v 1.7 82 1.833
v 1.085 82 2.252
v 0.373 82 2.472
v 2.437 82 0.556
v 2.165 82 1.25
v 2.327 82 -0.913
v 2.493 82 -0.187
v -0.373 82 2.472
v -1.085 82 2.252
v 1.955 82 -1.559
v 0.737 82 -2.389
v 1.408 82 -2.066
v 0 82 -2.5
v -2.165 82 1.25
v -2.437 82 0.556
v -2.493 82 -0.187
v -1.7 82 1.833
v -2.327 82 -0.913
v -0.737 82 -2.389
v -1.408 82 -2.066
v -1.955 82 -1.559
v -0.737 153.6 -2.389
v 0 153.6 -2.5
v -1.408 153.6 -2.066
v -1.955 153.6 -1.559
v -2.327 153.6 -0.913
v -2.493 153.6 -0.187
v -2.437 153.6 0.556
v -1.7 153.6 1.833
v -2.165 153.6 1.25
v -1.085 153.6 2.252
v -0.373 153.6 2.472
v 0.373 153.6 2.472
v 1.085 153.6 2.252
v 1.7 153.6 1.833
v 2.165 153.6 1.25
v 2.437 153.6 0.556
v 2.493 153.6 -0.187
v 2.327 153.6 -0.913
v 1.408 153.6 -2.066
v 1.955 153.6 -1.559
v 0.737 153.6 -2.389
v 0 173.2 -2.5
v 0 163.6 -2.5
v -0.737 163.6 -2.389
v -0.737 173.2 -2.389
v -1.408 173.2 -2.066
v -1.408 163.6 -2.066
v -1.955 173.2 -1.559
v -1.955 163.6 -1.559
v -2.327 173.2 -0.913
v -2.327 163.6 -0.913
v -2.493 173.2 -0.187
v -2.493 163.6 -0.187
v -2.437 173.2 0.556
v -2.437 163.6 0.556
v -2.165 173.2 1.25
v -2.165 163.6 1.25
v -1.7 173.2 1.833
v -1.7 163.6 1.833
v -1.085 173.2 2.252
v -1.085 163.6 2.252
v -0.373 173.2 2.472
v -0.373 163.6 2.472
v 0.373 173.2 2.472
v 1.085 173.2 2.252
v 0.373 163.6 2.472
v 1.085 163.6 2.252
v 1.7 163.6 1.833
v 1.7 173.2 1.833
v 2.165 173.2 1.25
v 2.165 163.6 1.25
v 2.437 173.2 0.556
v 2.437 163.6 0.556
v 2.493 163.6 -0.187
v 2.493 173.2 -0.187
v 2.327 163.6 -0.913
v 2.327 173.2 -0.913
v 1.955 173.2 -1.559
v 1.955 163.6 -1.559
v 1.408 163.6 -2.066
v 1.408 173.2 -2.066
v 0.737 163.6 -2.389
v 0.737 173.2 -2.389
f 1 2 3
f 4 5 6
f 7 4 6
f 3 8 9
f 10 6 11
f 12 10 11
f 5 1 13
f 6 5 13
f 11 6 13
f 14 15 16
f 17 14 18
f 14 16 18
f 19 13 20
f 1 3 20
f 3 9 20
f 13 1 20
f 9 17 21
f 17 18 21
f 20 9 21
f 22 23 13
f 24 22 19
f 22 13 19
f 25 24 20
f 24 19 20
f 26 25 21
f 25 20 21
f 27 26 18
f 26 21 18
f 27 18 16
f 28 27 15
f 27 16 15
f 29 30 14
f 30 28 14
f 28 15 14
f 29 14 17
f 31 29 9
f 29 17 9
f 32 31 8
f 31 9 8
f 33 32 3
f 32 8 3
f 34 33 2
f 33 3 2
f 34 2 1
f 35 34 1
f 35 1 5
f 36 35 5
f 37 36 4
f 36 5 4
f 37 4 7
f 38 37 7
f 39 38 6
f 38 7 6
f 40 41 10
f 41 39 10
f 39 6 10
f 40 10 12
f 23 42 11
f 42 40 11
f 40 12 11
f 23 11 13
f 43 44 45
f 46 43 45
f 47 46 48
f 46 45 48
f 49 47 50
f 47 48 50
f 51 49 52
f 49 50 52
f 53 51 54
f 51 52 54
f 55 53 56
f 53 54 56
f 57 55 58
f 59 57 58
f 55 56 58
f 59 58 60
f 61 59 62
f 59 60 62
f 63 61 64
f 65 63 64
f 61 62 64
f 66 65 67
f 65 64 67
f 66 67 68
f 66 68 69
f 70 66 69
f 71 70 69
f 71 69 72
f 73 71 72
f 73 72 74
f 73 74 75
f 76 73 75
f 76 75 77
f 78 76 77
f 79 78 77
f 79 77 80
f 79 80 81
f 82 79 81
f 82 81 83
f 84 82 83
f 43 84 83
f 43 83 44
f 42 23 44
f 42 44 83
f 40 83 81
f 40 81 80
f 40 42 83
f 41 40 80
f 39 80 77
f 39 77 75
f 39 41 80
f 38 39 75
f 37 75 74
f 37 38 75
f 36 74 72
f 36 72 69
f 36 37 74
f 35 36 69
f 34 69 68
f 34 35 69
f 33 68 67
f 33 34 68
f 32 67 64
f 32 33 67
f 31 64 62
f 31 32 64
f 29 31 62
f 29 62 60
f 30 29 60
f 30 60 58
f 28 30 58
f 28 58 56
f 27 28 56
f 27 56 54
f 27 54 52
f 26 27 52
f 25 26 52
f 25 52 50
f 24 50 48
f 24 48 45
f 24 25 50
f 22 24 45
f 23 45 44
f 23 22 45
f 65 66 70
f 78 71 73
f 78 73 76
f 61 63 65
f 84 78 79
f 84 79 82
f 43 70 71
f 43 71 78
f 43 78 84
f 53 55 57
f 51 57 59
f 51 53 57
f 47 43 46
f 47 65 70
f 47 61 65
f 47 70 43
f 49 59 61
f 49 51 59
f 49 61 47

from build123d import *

# Parameters (mm, degrees)
SKETCH_1_R               = 2.5
EXTRUDE_1_DEPTH          = 173.2
SKETCH_3_R               = 77
EXTRUDE_4_DEPTH          = 4
SKETCH_8_R               = 15
EXTRUDE_7_DEPTH          = 3
CUT_EXTRUDE_2_REACH      = 198.527
SKETCH_9_R               = 5
PATTERN_CIRCULAR_1_COUNT = 3
SKETCH_11_R              = 2.5
CUT_EXTRUDE_4_DEPTH      = 143.040275978
EXTRUDE_START            = 6.6
SKETCH_12_R              = 2.5
EXTRUDE_8_DEPTH          = 6.6
CUT_EXTRUDE_6_REACH      = 138.076
SKETCH_13_R              = 77
SKETCH_13_R_2            = 15
SKETCH_14_R              = 15
CUT_EXTRUDE_7_DEPTH      = 10
SKETCH_15_R              = 2.5
EXTRUDE_9_DEPTH          = 10


with BuildPart() as part:
    # 草图1 → 凸台-拉伸1 (new body)
    with BuildSketch(Plane(origin=(0, 0, 0), x_dir=(1, 0, 0), z_dir=(0, 1, 0))):
        with Locations(Location((0, 0, 0), (0, 0, 90))):
            Circle(SKETCH_1_R)
    extrude(amount=EXTRUDE_1_DEPTH)

    # 草图3 → 凸台-拉伸4 (add)
    with BuildSketch(Plane(origin=(0, 163.6, 0), x_dir=(1, 0, 0), z_dir=(0, 1, 0))):
        with Locations(Location((0, 0, 0), (0, 0, 270))):
            Circle(SKETCH_3_R)
    extrude(amount=-EXTRUDE_4_DEPTH)

    # 草图8 → 凸台-拉伸7 (add)
    with BuildSketch(Plane(origin=(0, 159.6, 0), x_dir=(-1, 0, 0), z_dir=(0, -1, 0))):
        with Locations(Location((0, 0, 0), (0, 0, 270))):
            Circle(SKETCH_8_R)
    extrude(amount=EXTRUDE_7_DEPTH)

    # 草图9 → 切除-拉伸2 (cut, up to next)
    with BuildSketch(Plane(origin=(0, 163.6, 0), x_dir=(1, 0, 0), z_dir=(0, 1, 0)), mode=Mode.PRIVATE) as cut_extrude_2_sk1:
        with Locations(Location((0, 45, 0), (0, 0, 270))):
            Circle(SKETCH_9_R)
    cut_extrude_2_tool1 = extrude(cut_extrude_2_sk1.sketch, amount=-CUT_EXTRUDE_2_REACH, mode=Mode.PRIVATE) & part.part
    cut_extrude_2 = cut_extrude_2_tool1.solids().sort_by_distance((0, 163.6, -45))[0]
    add(cut_extrude_2, mode=Mode.SUBTRACT)

    # 阵列(圆周)1: 切除-拉伸2 ×3 about axis
    pattern_circular_1_axis = Axis((0, 0, 0), (0, 1, 0))
    for i in range(1, PATTERN_CIRCULAR_1_COUNT):
        add(cut_extrude_2.rotate(pattern_circular_1_axis, i * 360 / PATTERN_CIRCULAR_1_COUNT), mode=Mode.SUBTRACT)

    # 草图11 → 切除-拉伸4 (cut, through all)
    with BuildSketch(Plane(origin=(0, 82, 0), x_dir=(1, 0, 0), z_dir=(0, 1, 0))):
        with Locations(Location((0, 0, 0), (0, 0, 90))):
            Circle(SKETCH_11_R)
    extrude(amount=-CUT_EXTRUDE_4_DEPTH, mode=Mode.SUBTRACT)

    # 草图12 → 凸台-拉伸8 (add)
    with BuildSketch(Plane(origin=(0, 153.6, 0), x_dir=(-1, 0, 0), z_dir=(0, -1, 0)).offset(EXTRUDE_START)):
        with Locations(Location((0, 0, 0), (0, 0, 90))):
            Circle(SKETCH_12_R)
    extrude(amount=-EXTRUDE_8_DEPTH)

    # 草图13 → 切除-拉伸6 (cut, up to next)
    with BuildSketch(Plane(origin=(0, 163.6, 0), x_dir=(1, 0, 0), z_dir=(0, 1, 0)), mode=Mode.PRIVATE) as cut_extrude_6_sk1:
        Circle(SKETCH_13_R)
        with Locations(Location((0, 0, 0), (0, 0, 270))):
            Circle(SKETCH_13_R_2, mode=Mode.SUBTRACT)
    cut_extrude_6_tool1 = extrude(cut_extrude_6_sk1.sketch, amount=-CUT_EXTRUDE_6_REACH, mode=Mode.PRIVATE) & part.part
    add(cut_extrude_6_tool1.solids().sort_by_distance((-74.822111, 163.6, 0))[0], mode=Mode.SUBTRACT)

    # 草图14 → 切除-拉伸7 (cut)
    with BuildSketch(Plane(origin=(0, 163.6, 0), x_dir=(1, 0, 0), z_dir=(0, 1, 0))):
        Circle(SKETCH_14_R)
    extrude(amount=-CUT_EXTRUDE_7_DEPTH, mode=Mode.SUBTRACT)


with BuildPart() as cut_extrude_7_piece_1:
    # of the separate pieces the step leaves, piece 1, a body of its own (cut_extrude_7_pieces)
    add(part.part.solids().sort_by_distance((0, 82, -2.5))[0])



with BuildPart() as cut_extrude_7_piece_2:
    # of the separate pieces the step leaves, piece 2, a body of its own (cut_extrude_7_pieces)
    add(part.part.solids().sort_by_distance((0, 163.6, -2.5))[0])


with BuildPart() as cut_extrude_7_piece_1_1:
    add(cut_extrude_7_piece_1.part)

    add(cut_extrude_7_piece_2.part)  # 凸台-拉伸9 merges 切除-拉伸7 piece 2
    # 草图15 → 凸台-拉伸9 (add)
    with BuildSketch(Plane(origin=(0, 153.6, 0), x_dir=(-1, 0, 0), z_dir=(0, -1, 0))):
        with Locations(Location((0, 0, 0), (0, 0, 90))):
            Circle(SKETCH_15_R)
    extrude(amount=-EXTRUDE_9_DEPTH)


solid = cut_extrude_7_piece_1_1.part
